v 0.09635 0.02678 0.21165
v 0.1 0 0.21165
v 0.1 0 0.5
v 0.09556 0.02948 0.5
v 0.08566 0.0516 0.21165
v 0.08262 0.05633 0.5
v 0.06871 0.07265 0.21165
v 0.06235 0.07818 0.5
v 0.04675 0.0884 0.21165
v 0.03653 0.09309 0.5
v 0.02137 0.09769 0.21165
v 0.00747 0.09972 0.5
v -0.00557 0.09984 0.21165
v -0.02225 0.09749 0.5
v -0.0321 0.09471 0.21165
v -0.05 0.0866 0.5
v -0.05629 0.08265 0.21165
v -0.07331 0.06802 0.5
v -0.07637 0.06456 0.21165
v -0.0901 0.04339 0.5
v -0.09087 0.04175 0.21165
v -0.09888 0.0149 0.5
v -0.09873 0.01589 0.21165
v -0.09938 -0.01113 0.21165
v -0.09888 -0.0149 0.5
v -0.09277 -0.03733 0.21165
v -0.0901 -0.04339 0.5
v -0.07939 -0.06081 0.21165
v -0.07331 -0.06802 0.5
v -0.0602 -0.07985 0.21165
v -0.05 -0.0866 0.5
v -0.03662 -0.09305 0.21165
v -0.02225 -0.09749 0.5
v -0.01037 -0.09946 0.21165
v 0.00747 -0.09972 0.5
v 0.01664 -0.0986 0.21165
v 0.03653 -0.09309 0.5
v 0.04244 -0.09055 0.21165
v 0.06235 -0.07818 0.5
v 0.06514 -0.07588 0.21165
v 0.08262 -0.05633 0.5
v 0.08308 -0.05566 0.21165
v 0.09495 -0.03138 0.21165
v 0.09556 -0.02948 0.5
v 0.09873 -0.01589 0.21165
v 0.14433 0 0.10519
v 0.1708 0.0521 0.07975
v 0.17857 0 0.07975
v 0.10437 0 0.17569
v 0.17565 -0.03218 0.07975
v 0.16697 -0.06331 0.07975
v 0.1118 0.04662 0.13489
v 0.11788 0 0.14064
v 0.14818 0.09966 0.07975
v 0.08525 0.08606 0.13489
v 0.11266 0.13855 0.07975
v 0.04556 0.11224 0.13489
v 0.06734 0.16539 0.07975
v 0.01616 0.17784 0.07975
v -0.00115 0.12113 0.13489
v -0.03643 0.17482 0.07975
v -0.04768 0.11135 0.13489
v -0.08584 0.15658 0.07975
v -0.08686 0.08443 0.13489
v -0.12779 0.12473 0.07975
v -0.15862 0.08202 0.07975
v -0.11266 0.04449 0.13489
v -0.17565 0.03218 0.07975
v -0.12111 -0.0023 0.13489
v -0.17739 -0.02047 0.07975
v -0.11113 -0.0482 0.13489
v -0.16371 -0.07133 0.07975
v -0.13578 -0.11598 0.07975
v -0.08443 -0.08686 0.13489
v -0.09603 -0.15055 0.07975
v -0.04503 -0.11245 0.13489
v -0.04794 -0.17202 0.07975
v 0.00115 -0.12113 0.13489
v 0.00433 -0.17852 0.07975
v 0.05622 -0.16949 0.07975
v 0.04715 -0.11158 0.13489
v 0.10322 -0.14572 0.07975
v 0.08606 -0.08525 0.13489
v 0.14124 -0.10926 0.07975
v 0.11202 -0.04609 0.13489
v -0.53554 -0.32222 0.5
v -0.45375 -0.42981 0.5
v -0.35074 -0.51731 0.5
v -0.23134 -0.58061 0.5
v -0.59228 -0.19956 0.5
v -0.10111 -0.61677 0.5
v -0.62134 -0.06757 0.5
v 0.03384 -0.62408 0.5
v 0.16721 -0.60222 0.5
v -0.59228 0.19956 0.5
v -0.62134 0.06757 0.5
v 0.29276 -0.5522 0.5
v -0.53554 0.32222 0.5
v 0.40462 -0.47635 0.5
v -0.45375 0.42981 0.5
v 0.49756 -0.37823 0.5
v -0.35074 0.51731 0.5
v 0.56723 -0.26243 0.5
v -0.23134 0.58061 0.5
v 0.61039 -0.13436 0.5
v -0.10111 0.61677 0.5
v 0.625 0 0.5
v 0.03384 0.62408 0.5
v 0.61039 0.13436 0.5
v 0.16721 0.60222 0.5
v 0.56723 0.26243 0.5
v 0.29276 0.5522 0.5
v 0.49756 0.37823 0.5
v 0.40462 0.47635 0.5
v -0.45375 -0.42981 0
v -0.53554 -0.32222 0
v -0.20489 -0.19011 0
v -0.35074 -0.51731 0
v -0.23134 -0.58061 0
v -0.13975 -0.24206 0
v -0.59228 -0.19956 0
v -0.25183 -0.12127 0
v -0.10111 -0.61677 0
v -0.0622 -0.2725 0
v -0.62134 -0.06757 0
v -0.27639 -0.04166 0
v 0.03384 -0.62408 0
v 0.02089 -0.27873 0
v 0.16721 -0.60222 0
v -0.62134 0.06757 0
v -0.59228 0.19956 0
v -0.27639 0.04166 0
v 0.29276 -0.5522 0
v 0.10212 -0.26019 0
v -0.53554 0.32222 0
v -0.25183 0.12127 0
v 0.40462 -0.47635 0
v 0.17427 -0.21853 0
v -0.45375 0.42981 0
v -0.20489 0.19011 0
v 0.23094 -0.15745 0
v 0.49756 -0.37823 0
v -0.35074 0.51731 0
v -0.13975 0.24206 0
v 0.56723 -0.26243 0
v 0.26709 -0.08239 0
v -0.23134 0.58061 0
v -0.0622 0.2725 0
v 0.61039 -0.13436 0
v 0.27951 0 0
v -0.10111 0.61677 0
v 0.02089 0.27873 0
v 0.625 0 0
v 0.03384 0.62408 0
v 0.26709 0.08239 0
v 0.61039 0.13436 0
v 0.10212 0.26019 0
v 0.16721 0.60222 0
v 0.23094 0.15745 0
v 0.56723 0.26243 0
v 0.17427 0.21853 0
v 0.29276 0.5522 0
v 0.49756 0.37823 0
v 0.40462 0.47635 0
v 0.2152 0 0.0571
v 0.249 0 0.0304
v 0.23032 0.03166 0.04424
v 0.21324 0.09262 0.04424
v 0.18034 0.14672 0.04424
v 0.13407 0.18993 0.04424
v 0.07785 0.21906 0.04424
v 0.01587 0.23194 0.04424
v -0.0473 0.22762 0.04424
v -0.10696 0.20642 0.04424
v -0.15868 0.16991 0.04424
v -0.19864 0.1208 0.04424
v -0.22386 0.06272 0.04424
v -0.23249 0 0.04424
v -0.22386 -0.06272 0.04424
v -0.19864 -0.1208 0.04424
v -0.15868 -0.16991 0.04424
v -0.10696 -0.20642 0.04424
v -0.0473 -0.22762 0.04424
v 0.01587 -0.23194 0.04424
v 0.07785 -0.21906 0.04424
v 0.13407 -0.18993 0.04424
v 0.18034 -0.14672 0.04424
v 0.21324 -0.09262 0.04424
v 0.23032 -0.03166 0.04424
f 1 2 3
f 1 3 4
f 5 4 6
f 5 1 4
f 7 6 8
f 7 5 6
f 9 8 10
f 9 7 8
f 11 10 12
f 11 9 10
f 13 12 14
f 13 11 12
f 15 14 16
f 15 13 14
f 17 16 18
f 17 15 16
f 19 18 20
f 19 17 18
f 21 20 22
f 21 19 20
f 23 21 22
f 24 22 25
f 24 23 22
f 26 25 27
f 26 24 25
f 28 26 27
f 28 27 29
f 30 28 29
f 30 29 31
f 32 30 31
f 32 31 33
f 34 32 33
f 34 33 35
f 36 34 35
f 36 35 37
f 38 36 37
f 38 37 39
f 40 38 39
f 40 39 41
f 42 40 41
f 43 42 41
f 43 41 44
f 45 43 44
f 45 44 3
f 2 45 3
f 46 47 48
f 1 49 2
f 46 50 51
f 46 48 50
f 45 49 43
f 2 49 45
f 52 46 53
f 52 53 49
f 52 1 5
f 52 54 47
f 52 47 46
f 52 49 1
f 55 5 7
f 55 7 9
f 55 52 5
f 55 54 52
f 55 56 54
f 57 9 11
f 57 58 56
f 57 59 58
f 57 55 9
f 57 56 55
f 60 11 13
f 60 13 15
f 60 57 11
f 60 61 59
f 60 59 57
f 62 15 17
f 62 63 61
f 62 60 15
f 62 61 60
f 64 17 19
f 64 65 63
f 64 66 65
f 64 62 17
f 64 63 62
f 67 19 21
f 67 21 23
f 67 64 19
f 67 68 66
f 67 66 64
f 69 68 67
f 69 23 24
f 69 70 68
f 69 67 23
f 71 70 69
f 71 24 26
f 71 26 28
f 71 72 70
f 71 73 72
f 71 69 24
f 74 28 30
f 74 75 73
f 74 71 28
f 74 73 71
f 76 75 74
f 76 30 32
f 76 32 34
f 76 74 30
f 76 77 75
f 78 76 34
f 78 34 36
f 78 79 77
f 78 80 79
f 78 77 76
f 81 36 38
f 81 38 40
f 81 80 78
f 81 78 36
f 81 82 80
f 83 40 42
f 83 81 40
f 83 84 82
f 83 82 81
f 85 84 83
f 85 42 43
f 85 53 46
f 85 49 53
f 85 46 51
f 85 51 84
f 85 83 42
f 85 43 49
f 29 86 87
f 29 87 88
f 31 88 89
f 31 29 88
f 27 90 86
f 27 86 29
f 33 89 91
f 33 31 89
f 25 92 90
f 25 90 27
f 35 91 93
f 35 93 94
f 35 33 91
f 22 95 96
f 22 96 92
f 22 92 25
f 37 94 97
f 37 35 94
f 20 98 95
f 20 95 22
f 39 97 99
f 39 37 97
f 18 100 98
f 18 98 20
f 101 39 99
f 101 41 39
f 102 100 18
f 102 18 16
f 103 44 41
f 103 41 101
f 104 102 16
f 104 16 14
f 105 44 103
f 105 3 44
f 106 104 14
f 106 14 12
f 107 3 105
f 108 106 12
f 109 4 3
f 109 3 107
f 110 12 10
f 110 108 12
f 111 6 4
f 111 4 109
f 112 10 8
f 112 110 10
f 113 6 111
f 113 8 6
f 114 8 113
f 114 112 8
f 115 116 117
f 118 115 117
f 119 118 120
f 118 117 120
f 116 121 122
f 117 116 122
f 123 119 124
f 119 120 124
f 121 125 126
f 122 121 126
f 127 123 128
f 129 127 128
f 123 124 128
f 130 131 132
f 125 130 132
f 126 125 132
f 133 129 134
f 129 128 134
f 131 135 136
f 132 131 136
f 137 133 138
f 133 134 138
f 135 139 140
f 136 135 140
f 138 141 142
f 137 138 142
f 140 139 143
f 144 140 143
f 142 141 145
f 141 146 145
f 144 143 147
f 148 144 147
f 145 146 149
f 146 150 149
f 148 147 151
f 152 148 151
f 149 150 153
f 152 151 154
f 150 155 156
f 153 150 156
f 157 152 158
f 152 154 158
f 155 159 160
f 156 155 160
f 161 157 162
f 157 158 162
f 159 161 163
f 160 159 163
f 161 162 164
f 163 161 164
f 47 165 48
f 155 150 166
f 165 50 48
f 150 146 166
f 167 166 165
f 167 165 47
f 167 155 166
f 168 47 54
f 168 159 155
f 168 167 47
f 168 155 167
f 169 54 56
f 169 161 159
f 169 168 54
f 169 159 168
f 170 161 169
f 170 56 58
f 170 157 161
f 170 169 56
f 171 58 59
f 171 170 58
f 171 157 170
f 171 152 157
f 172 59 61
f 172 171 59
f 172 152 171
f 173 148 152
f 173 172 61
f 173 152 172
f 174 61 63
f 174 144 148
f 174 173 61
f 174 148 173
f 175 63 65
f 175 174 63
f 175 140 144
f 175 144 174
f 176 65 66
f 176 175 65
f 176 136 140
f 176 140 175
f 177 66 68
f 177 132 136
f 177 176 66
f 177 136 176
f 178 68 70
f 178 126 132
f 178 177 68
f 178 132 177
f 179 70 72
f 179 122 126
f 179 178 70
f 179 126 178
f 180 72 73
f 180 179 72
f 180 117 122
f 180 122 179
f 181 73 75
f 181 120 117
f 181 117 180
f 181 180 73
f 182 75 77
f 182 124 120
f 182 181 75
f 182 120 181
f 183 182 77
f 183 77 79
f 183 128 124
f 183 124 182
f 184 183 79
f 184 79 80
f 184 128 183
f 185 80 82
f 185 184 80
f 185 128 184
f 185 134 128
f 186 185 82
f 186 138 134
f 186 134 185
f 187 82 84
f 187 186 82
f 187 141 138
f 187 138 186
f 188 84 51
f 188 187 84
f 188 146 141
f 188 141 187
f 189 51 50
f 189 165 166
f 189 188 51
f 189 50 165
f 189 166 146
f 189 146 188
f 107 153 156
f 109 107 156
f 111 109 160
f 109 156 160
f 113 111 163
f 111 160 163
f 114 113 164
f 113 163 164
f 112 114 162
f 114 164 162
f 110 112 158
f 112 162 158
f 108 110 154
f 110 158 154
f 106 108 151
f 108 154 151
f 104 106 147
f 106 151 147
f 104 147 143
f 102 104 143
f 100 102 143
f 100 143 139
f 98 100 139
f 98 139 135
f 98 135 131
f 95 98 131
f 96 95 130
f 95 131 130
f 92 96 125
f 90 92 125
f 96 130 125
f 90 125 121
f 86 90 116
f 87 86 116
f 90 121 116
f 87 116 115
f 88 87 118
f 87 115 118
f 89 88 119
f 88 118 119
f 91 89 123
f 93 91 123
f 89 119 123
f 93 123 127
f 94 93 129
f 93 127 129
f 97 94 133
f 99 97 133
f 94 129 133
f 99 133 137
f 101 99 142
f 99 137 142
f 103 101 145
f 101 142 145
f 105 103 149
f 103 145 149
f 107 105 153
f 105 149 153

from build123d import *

# Parameters (mm, degrees)
CROQUIS1_R              = 0.625
CROQUIS1_R_2            = 0.1
SALIENTE_EXTRUIR1_DEPTH = 0.5
REDONDEO1_R             = 0.15


with BuildPart() as part:
    # Croquis1 → Saliente-Extruir1 (new body)
    with BuildSketch(Plane.XY):
        Circle(CROQUIS1_R)
        Circle(CROQUIS1_R_2, mode=Mode.SUBTRACT)
    extrude(amount=SALIENTE_EXTRUIR1_DEPTH)

    # Croquis2 → Cortar-Revolución3 (revolve, cut)
    with BuildSketch(Plane(origin=(0, 0, 0), x_dir=(1, 0, 0), z_dir=(0, 1, 0))):
        with BuildLine():
            Line((0, 0), (0, -0.125))
            ThreePointArc((0, -0.125), (0.153093109, -0.092326598), (0.279508497, 0))
            Line((0.279508497, 0), (0, 0))
        make_face()
    revolve(axis=Axis((0, 0, 0), (0, 0, 1)), mode=Mode.SUBTRACT)

    # Redondeo1
    redondeo1_edges = [part.edges().sort_by_distance(p)[0] for p in [
        (-0.1, 0, 0.111420807),
    ]]
    fillet(redondeo1_edges, radius=REDONDEO1_R)


solid = part.part
